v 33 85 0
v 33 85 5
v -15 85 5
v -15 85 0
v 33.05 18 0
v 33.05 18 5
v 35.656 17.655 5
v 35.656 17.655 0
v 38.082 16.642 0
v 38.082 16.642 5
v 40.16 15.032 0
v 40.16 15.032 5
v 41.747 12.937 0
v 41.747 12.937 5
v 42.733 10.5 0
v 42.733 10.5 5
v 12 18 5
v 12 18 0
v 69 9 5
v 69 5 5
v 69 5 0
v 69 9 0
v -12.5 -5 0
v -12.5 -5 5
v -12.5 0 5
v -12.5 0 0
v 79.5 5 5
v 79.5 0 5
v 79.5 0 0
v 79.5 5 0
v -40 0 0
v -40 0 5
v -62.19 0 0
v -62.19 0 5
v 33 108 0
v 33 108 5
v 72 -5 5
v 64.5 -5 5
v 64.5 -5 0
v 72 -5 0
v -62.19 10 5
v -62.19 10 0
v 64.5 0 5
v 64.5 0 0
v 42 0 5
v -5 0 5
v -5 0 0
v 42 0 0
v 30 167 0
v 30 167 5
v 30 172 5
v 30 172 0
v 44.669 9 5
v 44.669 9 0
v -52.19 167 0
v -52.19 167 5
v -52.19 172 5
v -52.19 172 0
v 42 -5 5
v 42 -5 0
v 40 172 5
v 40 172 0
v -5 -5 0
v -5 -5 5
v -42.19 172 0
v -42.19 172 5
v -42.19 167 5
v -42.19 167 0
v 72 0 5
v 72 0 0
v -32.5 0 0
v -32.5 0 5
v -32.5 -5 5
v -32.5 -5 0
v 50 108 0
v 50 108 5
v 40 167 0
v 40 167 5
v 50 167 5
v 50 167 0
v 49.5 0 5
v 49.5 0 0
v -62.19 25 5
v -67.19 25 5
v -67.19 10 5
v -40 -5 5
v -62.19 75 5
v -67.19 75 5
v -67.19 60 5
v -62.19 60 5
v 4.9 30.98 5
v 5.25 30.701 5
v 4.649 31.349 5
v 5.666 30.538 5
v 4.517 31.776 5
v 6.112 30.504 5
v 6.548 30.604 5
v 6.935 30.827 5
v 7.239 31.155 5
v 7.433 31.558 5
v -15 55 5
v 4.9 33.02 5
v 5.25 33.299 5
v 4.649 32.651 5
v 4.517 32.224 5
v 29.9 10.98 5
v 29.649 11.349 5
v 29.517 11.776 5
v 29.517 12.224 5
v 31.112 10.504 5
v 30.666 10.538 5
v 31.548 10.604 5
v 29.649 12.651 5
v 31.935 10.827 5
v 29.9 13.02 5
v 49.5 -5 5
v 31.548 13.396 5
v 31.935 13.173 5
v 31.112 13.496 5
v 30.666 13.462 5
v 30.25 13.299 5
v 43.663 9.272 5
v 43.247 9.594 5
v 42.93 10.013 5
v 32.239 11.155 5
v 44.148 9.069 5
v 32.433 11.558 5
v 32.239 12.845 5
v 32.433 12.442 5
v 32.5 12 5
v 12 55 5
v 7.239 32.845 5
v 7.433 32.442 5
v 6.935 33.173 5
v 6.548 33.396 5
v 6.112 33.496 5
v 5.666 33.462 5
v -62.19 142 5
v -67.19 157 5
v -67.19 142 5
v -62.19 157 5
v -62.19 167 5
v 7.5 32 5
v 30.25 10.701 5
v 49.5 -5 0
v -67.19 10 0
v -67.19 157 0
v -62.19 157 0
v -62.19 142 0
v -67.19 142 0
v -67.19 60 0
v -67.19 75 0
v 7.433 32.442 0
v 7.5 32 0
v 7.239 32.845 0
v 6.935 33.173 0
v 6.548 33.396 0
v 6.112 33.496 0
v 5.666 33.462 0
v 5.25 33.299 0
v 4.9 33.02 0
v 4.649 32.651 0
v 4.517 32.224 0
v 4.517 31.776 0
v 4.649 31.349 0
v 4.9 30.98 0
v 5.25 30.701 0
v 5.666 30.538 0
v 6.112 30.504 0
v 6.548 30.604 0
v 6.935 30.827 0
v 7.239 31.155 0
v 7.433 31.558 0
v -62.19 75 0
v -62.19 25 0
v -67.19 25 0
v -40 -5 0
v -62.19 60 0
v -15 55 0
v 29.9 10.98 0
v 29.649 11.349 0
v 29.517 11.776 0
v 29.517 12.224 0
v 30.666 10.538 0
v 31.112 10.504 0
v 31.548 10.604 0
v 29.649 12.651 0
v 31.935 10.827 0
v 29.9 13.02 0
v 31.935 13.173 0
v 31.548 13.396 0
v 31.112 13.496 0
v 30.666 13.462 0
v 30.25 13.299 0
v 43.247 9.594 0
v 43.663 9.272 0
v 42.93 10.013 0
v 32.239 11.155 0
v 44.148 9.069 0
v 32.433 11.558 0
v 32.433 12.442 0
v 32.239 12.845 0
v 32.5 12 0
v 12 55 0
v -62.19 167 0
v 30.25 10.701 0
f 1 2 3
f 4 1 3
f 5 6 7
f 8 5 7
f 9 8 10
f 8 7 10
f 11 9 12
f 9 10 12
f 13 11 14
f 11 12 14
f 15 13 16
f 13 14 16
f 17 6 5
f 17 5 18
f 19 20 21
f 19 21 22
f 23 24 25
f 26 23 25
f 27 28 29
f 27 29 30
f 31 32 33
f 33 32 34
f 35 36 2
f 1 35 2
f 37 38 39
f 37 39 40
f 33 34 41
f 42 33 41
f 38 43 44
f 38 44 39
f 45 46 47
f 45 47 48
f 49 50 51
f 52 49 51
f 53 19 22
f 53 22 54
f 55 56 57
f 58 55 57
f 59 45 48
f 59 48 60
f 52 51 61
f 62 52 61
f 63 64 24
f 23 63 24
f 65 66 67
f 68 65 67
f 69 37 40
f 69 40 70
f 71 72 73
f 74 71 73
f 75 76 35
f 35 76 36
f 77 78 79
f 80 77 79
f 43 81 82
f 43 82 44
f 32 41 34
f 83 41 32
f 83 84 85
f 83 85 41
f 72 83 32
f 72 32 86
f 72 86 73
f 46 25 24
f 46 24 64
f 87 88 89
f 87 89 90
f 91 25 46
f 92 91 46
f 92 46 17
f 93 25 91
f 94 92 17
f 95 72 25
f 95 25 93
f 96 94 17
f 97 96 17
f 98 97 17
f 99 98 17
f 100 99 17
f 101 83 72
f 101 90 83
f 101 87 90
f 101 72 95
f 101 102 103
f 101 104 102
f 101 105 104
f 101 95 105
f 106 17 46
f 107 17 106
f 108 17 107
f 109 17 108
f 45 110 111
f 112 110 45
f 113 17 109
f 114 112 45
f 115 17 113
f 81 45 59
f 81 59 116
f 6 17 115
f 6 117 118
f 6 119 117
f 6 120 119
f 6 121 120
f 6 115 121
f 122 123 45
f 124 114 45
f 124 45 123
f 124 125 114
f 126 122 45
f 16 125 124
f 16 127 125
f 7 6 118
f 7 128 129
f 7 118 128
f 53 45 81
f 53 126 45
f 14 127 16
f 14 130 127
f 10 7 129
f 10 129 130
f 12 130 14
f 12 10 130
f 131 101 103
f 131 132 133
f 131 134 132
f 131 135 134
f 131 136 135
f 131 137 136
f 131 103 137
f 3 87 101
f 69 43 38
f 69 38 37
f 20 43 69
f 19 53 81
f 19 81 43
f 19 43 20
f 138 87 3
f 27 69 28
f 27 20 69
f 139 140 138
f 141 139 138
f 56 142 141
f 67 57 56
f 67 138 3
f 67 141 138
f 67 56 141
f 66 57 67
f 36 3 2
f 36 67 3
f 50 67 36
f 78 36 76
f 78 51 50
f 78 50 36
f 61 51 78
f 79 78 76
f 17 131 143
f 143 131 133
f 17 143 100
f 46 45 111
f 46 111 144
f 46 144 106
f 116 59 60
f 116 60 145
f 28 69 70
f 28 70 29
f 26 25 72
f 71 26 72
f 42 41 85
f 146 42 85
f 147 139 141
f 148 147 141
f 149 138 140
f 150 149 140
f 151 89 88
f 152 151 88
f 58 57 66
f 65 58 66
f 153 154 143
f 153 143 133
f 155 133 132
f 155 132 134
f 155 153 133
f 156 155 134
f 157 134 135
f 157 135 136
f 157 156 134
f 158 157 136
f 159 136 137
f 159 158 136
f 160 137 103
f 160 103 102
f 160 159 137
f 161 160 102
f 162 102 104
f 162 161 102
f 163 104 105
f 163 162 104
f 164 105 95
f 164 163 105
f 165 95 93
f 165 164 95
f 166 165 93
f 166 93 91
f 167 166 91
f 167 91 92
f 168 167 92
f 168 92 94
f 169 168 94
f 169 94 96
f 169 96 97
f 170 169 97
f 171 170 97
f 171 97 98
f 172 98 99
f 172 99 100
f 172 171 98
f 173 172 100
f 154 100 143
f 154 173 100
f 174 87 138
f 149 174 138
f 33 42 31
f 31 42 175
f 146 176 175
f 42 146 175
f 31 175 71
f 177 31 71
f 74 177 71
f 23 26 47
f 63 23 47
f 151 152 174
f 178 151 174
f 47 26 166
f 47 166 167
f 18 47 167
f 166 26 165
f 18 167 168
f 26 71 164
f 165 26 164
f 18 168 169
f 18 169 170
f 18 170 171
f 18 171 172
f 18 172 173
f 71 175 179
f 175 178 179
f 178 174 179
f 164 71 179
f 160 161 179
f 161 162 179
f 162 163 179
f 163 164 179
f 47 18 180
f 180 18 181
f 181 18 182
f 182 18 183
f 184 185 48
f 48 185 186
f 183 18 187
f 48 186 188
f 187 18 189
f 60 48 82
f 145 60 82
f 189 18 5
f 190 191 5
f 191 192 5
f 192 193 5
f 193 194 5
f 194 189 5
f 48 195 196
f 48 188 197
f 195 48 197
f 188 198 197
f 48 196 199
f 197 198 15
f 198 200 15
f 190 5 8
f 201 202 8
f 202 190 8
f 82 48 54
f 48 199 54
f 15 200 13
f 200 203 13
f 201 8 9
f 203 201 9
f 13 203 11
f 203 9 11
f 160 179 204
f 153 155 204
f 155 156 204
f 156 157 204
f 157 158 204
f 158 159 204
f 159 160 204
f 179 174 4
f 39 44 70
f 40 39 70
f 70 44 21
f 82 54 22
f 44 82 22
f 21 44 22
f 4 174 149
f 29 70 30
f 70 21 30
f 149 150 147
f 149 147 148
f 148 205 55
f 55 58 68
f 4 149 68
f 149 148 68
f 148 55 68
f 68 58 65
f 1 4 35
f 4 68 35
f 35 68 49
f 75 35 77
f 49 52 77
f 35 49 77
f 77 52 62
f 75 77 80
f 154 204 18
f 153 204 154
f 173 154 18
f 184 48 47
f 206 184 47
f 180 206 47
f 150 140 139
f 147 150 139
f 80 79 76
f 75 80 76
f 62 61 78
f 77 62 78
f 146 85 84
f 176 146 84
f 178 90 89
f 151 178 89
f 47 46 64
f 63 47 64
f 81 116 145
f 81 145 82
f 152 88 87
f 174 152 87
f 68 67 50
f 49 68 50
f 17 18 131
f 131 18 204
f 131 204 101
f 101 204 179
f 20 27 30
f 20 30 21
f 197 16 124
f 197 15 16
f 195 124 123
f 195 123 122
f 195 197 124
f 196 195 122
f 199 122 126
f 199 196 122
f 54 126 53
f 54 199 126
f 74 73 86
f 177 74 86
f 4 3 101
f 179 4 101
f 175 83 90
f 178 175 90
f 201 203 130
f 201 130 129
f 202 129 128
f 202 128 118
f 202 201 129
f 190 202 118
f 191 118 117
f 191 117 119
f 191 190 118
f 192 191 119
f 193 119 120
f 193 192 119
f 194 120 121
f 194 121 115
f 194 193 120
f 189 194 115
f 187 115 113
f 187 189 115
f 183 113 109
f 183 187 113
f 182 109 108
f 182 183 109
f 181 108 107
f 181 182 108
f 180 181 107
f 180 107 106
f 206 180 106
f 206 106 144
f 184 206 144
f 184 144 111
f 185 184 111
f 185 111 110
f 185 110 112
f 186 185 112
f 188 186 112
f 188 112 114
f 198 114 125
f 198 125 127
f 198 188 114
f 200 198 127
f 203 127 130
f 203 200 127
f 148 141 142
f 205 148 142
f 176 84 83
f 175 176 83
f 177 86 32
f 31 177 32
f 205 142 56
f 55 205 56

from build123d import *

# Parameters (mm, degrees)
ESQUISSE1_R        = 1.5
BOSS_EXTRU_1_DEPTH = 5
BOSS_EXTRU_2_DEPTH = 5
CONG_1_R           = 10
CONG_2_R           = 2


with BuildPart() as part:
    # Esquisse1 → Boss.-Extru.1 (new body)
    with BuildSketch(Plane.XY):
        Polygon((0, 0), (37, 0), (37, 18), (12, 18), (12, 55), (0, 55), align=None)
        with Locations((6, 32)):
            Circle(ESQUISSE1_R, mode=Mode.SUBTRACT)
        with Locations((31, 12)):
            Circle(ESQUISSE1_R, mode=Mode.SUBTRACT)
    extrude(amount=BOSS_EXTRU_1_DEPTH)

    # Esquisse2 → Boss.-Extru.2 (add)
    with BuildSketch(Plane.XY.offset(5)):
        Polygon((37, 0), (42, 0), (42, -5), (49.5, -5), (49.5, 0), (64.5, 0), (64.5, -5), (72, -5), (72, 0), (79.5, 0), (79.5, 5), (69, 5), (69, 9), (43, 9), (43, 18), (37, 18), align=None)
        Polygon((0, 0), (-5, 0), (-5, -5), (-12.5, -5), (-12.5, 0), (-32.5, 0), (-32.5, -5), (-40, -5), (-40, 0), (-62.19, 0), (-62.19, 10), (-67.19, 10), (-67.19, 25), (-62.19, 25), (-62.19, 60), (-67.19, 60), (-67.19, 75), (-62.19, 75), (-62.19, 142), (-67.19, 142), (-67.19, 157), (-62.19, 157), (-62.19, 167), (-52.19, 167), (-52.19, 172), (-42.19, 172), (-42.19, 167), (30, 167), (30, 172), (40, 172), (40, 167), (50, 167), (50, 108), (33, 108), (33, 85), (-15, 85), (-15, 55), (0, 55), align=None)
    extrude(amount=-BOSS_EXTRU_2_DEPTH)

    # Congé1
    # the kernel refuses this fillet: 10 mm, written as the material it takes off along each edge
    with BuildSketch(Plane(origin=(43, 18, 29.874685928), x_dir=(0, -1, 0), z_dir=(0, 0, -1))) as cong_1_piece_1:
        with BuildLine():
            CenterArc((10, 9.949874371), CONG_1_R, 180, 84.260829523)
            Line((0, 9.949874371), (-0.2, 9.949874371))
            Line((-0.2, 9.949874371), (-0.2, 0))
            Line((-0.2, 0), (0, -0.2))
            ThreePointArc((0, -0.2), (4.5, -0.2), (8.98, -0.198997487))
            Line((8.98, -0.198997487), (9, 0))
        make_face()
    extrude(amount=54.749371855, mode=Mode.SUBTRACT)

    # Congé2
    cong_2_edges = [part.edges().sort_by_distance(p)[0] for p in [
        (43, 9, 2.5),
    ]]
    fillet(cong_2_edges, radius=CONG_2_R)


solid = part.part
